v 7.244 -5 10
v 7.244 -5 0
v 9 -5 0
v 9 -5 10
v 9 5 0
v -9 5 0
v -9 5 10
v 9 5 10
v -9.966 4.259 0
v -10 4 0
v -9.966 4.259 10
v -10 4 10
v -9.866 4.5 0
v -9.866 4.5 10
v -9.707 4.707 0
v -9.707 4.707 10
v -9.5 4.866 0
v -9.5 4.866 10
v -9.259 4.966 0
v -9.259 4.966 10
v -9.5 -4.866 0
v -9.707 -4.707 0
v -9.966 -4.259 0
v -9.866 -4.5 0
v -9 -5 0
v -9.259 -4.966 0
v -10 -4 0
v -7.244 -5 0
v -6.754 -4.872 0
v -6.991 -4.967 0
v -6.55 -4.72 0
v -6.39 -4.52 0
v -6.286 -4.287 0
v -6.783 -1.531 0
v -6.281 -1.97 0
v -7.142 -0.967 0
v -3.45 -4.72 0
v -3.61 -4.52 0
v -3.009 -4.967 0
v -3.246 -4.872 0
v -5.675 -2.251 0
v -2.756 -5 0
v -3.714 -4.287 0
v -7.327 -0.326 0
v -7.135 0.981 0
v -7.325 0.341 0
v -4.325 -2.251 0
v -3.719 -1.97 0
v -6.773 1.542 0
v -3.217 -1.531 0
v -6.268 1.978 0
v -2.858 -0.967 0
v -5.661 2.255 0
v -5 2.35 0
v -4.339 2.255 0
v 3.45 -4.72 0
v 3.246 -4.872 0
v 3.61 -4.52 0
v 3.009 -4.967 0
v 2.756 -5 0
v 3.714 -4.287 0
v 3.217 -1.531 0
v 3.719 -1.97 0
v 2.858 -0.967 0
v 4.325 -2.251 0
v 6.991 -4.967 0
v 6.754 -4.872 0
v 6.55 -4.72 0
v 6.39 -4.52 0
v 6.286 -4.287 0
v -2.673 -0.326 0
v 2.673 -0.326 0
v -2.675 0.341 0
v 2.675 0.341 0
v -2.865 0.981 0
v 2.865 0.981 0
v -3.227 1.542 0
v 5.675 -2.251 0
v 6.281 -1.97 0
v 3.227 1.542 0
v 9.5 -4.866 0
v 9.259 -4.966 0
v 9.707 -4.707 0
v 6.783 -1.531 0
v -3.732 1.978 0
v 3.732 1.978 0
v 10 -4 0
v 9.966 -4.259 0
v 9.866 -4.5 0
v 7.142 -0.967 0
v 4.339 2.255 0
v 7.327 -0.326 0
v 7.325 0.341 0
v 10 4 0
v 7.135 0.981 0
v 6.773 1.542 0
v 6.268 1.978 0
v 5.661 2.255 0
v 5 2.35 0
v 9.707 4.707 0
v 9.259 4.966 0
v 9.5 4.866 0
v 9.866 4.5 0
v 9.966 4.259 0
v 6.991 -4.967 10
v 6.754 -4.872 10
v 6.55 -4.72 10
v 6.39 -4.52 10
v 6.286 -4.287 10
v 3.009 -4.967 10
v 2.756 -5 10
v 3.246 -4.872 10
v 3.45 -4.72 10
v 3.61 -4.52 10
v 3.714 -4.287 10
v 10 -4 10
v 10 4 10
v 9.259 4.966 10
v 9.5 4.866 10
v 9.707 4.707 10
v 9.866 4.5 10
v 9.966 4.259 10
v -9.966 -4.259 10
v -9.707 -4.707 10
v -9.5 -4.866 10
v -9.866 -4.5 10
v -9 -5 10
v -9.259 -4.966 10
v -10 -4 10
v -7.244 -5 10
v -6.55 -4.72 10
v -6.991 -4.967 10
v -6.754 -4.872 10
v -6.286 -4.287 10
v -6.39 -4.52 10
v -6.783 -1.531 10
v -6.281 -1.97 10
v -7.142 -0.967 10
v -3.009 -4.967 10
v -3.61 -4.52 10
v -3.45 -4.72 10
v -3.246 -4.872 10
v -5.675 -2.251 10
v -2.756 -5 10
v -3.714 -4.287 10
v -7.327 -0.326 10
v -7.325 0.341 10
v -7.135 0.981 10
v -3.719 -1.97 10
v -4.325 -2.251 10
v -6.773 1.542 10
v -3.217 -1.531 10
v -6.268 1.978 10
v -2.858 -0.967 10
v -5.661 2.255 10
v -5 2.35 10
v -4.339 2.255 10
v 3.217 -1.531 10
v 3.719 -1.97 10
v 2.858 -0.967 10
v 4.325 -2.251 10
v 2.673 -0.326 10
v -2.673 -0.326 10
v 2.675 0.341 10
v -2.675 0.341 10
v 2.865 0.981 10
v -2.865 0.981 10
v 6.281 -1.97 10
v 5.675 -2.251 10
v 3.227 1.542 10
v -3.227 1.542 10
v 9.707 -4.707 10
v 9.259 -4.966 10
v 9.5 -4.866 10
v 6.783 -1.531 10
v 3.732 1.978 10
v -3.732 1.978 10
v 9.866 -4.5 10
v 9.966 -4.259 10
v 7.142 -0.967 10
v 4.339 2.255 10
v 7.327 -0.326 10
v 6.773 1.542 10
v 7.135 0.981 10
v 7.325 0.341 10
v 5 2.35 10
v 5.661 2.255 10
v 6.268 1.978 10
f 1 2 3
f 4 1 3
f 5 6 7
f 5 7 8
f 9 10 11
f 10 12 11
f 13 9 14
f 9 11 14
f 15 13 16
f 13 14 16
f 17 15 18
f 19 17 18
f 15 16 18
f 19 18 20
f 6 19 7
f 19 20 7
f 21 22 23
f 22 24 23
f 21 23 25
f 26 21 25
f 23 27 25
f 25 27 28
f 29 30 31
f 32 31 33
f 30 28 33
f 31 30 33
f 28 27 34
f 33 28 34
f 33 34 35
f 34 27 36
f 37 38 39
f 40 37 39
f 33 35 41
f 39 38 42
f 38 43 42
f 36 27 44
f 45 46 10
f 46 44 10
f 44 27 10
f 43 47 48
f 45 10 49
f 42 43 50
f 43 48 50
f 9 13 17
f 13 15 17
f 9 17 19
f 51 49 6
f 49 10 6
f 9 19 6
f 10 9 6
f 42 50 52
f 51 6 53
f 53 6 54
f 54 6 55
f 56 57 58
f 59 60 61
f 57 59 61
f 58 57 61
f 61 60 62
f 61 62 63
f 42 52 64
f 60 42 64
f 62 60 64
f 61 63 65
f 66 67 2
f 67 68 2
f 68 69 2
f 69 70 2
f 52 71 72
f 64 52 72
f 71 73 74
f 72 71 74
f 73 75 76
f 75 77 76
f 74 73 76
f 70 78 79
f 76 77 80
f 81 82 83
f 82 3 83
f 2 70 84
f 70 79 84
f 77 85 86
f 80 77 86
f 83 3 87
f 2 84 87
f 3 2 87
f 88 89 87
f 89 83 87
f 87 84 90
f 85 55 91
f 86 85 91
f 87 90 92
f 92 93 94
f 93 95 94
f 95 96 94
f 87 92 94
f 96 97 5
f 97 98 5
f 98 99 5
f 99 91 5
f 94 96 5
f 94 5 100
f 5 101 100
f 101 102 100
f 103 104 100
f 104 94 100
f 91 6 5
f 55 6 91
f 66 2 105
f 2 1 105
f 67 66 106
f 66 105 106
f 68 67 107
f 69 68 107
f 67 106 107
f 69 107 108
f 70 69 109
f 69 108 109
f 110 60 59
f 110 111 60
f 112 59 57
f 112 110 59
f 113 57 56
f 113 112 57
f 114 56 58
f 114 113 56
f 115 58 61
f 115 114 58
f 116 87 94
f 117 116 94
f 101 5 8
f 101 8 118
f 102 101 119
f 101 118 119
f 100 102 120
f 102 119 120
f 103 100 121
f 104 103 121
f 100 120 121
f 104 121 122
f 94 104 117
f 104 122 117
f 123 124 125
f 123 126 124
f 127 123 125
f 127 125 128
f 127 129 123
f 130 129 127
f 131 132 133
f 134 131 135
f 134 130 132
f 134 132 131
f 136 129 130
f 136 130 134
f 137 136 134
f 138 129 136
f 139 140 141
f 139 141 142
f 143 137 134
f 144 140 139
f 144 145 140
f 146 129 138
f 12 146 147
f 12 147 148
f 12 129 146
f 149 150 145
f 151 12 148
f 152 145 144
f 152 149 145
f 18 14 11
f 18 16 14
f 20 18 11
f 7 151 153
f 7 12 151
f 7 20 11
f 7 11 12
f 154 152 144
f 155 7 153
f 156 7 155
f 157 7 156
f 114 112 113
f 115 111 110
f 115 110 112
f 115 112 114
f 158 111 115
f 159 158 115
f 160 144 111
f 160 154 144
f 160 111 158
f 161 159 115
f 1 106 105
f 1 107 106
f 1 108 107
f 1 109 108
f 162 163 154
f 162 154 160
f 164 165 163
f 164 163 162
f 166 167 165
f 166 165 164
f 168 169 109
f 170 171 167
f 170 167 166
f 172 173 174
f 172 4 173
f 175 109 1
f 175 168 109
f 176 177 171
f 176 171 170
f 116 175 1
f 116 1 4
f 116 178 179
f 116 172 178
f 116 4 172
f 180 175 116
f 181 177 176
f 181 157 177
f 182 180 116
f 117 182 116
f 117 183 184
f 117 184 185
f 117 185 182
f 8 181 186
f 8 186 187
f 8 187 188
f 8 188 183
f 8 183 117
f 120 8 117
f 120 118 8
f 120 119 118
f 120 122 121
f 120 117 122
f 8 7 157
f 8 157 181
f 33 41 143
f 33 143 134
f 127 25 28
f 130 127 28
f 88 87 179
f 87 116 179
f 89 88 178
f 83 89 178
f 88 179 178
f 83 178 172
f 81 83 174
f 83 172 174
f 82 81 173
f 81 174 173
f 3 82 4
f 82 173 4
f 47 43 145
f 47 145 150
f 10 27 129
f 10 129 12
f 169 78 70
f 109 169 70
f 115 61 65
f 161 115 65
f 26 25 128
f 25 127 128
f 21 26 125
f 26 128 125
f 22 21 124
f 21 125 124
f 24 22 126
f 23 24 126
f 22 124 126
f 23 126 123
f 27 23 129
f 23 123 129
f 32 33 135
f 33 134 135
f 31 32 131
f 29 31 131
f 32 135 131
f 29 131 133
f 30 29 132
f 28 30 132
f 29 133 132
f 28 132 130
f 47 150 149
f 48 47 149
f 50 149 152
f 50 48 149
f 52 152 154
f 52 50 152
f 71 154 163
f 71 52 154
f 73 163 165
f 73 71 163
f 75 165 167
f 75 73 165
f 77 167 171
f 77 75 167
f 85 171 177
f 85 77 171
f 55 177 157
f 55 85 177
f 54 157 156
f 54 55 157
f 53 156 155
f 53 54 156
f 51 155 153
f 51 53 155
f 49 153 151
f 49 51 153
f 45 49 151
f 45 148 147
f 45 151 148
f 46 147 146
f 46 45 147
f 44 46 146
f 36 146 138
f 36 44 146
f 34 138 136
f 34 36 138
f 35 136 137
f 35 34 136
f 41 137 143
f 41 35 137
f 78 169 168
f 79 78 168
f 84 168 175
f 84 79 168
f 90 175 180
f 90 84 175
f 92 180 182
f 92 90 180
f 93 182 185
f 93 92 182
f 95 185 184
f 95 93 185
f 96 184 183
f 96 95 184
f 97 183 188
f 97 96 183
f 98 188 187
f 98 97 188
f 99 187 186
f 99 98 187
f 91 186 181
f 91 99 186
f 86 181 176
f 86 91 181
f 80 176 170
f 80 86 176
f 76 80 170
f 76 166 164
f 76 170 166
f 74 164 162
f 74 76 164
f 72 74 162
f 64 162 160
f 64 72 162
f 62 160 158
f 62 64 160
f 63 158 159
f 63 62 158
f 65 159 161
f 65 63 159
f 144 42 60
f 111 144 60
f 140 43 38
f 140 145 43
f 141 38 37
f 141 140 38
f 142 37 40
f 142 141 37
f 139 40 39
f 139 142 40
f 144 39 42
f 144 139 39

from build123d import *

# Parameters (mm, degrees)
SKETCH_W        = 20
SKETCH_H        = 10
SKETCH_R        = 2.35
PAD_DEPTH       = 10
POCKET_DEPTH    = 10
POCKET001_DEPTH = 10
FILLET_R        = 1
FILLET001_R     = 1


with BuildPart() as part:
    # Sketch → Pad (new body)
    with BuildSketch(Plane.XY):
        Rectangle(SKETCH_W, SKETCH_H)
        with Locations((-5, 0)):
            Circle(SKETCH_R, mode=Mode.SUBTRACT)
        with Locations((5, 0)):
            Circle(SKETCH_R, mode=Mode.SUBTRACT)
    extrude(amount=PAD_DEPTH)

    # Sketch001 → Pocket (cut)
    with BuildSketch(Plane.XY):
        Polygon((-5, 0), (-6.5, -5), (-3.5, -5), align=None)
    extrude(amount=POCKET_DEPTH, mode=Mode.SUBTRACT)

    # MirroredSketch → Pocket001 (cut)
    with BuildSketch(Plane.XY):
        Polygon((5, 0), (6.5, -5), (3.5, -5), align=None)
    extrude(amount=POCKET001_DEPTH, mode=Mode.SUBTRACT)

    # Fillet
    fillet_edges = [part.edges().sort_by_distance(p)[0] for p in [
        (-6.5, -5, 5),
    ]]
    fillet(fillet_edges, radius=FILLET_R)

    # Fillet001
    fillet001_edges = [part.edges().sort_by_distance(p)[0] for p in [
        (-10, -5, 5),
        (-3.5, -5, 5),
        (3.5, -5, 5),
        (6.5, -5, 5),
        (10, -5, 5),
        (10, 5, 5),
        (-10, 5, 5),
    ]]
    fillet(fillet001_edges, radius=FILLET001_R)


solid = part.part
